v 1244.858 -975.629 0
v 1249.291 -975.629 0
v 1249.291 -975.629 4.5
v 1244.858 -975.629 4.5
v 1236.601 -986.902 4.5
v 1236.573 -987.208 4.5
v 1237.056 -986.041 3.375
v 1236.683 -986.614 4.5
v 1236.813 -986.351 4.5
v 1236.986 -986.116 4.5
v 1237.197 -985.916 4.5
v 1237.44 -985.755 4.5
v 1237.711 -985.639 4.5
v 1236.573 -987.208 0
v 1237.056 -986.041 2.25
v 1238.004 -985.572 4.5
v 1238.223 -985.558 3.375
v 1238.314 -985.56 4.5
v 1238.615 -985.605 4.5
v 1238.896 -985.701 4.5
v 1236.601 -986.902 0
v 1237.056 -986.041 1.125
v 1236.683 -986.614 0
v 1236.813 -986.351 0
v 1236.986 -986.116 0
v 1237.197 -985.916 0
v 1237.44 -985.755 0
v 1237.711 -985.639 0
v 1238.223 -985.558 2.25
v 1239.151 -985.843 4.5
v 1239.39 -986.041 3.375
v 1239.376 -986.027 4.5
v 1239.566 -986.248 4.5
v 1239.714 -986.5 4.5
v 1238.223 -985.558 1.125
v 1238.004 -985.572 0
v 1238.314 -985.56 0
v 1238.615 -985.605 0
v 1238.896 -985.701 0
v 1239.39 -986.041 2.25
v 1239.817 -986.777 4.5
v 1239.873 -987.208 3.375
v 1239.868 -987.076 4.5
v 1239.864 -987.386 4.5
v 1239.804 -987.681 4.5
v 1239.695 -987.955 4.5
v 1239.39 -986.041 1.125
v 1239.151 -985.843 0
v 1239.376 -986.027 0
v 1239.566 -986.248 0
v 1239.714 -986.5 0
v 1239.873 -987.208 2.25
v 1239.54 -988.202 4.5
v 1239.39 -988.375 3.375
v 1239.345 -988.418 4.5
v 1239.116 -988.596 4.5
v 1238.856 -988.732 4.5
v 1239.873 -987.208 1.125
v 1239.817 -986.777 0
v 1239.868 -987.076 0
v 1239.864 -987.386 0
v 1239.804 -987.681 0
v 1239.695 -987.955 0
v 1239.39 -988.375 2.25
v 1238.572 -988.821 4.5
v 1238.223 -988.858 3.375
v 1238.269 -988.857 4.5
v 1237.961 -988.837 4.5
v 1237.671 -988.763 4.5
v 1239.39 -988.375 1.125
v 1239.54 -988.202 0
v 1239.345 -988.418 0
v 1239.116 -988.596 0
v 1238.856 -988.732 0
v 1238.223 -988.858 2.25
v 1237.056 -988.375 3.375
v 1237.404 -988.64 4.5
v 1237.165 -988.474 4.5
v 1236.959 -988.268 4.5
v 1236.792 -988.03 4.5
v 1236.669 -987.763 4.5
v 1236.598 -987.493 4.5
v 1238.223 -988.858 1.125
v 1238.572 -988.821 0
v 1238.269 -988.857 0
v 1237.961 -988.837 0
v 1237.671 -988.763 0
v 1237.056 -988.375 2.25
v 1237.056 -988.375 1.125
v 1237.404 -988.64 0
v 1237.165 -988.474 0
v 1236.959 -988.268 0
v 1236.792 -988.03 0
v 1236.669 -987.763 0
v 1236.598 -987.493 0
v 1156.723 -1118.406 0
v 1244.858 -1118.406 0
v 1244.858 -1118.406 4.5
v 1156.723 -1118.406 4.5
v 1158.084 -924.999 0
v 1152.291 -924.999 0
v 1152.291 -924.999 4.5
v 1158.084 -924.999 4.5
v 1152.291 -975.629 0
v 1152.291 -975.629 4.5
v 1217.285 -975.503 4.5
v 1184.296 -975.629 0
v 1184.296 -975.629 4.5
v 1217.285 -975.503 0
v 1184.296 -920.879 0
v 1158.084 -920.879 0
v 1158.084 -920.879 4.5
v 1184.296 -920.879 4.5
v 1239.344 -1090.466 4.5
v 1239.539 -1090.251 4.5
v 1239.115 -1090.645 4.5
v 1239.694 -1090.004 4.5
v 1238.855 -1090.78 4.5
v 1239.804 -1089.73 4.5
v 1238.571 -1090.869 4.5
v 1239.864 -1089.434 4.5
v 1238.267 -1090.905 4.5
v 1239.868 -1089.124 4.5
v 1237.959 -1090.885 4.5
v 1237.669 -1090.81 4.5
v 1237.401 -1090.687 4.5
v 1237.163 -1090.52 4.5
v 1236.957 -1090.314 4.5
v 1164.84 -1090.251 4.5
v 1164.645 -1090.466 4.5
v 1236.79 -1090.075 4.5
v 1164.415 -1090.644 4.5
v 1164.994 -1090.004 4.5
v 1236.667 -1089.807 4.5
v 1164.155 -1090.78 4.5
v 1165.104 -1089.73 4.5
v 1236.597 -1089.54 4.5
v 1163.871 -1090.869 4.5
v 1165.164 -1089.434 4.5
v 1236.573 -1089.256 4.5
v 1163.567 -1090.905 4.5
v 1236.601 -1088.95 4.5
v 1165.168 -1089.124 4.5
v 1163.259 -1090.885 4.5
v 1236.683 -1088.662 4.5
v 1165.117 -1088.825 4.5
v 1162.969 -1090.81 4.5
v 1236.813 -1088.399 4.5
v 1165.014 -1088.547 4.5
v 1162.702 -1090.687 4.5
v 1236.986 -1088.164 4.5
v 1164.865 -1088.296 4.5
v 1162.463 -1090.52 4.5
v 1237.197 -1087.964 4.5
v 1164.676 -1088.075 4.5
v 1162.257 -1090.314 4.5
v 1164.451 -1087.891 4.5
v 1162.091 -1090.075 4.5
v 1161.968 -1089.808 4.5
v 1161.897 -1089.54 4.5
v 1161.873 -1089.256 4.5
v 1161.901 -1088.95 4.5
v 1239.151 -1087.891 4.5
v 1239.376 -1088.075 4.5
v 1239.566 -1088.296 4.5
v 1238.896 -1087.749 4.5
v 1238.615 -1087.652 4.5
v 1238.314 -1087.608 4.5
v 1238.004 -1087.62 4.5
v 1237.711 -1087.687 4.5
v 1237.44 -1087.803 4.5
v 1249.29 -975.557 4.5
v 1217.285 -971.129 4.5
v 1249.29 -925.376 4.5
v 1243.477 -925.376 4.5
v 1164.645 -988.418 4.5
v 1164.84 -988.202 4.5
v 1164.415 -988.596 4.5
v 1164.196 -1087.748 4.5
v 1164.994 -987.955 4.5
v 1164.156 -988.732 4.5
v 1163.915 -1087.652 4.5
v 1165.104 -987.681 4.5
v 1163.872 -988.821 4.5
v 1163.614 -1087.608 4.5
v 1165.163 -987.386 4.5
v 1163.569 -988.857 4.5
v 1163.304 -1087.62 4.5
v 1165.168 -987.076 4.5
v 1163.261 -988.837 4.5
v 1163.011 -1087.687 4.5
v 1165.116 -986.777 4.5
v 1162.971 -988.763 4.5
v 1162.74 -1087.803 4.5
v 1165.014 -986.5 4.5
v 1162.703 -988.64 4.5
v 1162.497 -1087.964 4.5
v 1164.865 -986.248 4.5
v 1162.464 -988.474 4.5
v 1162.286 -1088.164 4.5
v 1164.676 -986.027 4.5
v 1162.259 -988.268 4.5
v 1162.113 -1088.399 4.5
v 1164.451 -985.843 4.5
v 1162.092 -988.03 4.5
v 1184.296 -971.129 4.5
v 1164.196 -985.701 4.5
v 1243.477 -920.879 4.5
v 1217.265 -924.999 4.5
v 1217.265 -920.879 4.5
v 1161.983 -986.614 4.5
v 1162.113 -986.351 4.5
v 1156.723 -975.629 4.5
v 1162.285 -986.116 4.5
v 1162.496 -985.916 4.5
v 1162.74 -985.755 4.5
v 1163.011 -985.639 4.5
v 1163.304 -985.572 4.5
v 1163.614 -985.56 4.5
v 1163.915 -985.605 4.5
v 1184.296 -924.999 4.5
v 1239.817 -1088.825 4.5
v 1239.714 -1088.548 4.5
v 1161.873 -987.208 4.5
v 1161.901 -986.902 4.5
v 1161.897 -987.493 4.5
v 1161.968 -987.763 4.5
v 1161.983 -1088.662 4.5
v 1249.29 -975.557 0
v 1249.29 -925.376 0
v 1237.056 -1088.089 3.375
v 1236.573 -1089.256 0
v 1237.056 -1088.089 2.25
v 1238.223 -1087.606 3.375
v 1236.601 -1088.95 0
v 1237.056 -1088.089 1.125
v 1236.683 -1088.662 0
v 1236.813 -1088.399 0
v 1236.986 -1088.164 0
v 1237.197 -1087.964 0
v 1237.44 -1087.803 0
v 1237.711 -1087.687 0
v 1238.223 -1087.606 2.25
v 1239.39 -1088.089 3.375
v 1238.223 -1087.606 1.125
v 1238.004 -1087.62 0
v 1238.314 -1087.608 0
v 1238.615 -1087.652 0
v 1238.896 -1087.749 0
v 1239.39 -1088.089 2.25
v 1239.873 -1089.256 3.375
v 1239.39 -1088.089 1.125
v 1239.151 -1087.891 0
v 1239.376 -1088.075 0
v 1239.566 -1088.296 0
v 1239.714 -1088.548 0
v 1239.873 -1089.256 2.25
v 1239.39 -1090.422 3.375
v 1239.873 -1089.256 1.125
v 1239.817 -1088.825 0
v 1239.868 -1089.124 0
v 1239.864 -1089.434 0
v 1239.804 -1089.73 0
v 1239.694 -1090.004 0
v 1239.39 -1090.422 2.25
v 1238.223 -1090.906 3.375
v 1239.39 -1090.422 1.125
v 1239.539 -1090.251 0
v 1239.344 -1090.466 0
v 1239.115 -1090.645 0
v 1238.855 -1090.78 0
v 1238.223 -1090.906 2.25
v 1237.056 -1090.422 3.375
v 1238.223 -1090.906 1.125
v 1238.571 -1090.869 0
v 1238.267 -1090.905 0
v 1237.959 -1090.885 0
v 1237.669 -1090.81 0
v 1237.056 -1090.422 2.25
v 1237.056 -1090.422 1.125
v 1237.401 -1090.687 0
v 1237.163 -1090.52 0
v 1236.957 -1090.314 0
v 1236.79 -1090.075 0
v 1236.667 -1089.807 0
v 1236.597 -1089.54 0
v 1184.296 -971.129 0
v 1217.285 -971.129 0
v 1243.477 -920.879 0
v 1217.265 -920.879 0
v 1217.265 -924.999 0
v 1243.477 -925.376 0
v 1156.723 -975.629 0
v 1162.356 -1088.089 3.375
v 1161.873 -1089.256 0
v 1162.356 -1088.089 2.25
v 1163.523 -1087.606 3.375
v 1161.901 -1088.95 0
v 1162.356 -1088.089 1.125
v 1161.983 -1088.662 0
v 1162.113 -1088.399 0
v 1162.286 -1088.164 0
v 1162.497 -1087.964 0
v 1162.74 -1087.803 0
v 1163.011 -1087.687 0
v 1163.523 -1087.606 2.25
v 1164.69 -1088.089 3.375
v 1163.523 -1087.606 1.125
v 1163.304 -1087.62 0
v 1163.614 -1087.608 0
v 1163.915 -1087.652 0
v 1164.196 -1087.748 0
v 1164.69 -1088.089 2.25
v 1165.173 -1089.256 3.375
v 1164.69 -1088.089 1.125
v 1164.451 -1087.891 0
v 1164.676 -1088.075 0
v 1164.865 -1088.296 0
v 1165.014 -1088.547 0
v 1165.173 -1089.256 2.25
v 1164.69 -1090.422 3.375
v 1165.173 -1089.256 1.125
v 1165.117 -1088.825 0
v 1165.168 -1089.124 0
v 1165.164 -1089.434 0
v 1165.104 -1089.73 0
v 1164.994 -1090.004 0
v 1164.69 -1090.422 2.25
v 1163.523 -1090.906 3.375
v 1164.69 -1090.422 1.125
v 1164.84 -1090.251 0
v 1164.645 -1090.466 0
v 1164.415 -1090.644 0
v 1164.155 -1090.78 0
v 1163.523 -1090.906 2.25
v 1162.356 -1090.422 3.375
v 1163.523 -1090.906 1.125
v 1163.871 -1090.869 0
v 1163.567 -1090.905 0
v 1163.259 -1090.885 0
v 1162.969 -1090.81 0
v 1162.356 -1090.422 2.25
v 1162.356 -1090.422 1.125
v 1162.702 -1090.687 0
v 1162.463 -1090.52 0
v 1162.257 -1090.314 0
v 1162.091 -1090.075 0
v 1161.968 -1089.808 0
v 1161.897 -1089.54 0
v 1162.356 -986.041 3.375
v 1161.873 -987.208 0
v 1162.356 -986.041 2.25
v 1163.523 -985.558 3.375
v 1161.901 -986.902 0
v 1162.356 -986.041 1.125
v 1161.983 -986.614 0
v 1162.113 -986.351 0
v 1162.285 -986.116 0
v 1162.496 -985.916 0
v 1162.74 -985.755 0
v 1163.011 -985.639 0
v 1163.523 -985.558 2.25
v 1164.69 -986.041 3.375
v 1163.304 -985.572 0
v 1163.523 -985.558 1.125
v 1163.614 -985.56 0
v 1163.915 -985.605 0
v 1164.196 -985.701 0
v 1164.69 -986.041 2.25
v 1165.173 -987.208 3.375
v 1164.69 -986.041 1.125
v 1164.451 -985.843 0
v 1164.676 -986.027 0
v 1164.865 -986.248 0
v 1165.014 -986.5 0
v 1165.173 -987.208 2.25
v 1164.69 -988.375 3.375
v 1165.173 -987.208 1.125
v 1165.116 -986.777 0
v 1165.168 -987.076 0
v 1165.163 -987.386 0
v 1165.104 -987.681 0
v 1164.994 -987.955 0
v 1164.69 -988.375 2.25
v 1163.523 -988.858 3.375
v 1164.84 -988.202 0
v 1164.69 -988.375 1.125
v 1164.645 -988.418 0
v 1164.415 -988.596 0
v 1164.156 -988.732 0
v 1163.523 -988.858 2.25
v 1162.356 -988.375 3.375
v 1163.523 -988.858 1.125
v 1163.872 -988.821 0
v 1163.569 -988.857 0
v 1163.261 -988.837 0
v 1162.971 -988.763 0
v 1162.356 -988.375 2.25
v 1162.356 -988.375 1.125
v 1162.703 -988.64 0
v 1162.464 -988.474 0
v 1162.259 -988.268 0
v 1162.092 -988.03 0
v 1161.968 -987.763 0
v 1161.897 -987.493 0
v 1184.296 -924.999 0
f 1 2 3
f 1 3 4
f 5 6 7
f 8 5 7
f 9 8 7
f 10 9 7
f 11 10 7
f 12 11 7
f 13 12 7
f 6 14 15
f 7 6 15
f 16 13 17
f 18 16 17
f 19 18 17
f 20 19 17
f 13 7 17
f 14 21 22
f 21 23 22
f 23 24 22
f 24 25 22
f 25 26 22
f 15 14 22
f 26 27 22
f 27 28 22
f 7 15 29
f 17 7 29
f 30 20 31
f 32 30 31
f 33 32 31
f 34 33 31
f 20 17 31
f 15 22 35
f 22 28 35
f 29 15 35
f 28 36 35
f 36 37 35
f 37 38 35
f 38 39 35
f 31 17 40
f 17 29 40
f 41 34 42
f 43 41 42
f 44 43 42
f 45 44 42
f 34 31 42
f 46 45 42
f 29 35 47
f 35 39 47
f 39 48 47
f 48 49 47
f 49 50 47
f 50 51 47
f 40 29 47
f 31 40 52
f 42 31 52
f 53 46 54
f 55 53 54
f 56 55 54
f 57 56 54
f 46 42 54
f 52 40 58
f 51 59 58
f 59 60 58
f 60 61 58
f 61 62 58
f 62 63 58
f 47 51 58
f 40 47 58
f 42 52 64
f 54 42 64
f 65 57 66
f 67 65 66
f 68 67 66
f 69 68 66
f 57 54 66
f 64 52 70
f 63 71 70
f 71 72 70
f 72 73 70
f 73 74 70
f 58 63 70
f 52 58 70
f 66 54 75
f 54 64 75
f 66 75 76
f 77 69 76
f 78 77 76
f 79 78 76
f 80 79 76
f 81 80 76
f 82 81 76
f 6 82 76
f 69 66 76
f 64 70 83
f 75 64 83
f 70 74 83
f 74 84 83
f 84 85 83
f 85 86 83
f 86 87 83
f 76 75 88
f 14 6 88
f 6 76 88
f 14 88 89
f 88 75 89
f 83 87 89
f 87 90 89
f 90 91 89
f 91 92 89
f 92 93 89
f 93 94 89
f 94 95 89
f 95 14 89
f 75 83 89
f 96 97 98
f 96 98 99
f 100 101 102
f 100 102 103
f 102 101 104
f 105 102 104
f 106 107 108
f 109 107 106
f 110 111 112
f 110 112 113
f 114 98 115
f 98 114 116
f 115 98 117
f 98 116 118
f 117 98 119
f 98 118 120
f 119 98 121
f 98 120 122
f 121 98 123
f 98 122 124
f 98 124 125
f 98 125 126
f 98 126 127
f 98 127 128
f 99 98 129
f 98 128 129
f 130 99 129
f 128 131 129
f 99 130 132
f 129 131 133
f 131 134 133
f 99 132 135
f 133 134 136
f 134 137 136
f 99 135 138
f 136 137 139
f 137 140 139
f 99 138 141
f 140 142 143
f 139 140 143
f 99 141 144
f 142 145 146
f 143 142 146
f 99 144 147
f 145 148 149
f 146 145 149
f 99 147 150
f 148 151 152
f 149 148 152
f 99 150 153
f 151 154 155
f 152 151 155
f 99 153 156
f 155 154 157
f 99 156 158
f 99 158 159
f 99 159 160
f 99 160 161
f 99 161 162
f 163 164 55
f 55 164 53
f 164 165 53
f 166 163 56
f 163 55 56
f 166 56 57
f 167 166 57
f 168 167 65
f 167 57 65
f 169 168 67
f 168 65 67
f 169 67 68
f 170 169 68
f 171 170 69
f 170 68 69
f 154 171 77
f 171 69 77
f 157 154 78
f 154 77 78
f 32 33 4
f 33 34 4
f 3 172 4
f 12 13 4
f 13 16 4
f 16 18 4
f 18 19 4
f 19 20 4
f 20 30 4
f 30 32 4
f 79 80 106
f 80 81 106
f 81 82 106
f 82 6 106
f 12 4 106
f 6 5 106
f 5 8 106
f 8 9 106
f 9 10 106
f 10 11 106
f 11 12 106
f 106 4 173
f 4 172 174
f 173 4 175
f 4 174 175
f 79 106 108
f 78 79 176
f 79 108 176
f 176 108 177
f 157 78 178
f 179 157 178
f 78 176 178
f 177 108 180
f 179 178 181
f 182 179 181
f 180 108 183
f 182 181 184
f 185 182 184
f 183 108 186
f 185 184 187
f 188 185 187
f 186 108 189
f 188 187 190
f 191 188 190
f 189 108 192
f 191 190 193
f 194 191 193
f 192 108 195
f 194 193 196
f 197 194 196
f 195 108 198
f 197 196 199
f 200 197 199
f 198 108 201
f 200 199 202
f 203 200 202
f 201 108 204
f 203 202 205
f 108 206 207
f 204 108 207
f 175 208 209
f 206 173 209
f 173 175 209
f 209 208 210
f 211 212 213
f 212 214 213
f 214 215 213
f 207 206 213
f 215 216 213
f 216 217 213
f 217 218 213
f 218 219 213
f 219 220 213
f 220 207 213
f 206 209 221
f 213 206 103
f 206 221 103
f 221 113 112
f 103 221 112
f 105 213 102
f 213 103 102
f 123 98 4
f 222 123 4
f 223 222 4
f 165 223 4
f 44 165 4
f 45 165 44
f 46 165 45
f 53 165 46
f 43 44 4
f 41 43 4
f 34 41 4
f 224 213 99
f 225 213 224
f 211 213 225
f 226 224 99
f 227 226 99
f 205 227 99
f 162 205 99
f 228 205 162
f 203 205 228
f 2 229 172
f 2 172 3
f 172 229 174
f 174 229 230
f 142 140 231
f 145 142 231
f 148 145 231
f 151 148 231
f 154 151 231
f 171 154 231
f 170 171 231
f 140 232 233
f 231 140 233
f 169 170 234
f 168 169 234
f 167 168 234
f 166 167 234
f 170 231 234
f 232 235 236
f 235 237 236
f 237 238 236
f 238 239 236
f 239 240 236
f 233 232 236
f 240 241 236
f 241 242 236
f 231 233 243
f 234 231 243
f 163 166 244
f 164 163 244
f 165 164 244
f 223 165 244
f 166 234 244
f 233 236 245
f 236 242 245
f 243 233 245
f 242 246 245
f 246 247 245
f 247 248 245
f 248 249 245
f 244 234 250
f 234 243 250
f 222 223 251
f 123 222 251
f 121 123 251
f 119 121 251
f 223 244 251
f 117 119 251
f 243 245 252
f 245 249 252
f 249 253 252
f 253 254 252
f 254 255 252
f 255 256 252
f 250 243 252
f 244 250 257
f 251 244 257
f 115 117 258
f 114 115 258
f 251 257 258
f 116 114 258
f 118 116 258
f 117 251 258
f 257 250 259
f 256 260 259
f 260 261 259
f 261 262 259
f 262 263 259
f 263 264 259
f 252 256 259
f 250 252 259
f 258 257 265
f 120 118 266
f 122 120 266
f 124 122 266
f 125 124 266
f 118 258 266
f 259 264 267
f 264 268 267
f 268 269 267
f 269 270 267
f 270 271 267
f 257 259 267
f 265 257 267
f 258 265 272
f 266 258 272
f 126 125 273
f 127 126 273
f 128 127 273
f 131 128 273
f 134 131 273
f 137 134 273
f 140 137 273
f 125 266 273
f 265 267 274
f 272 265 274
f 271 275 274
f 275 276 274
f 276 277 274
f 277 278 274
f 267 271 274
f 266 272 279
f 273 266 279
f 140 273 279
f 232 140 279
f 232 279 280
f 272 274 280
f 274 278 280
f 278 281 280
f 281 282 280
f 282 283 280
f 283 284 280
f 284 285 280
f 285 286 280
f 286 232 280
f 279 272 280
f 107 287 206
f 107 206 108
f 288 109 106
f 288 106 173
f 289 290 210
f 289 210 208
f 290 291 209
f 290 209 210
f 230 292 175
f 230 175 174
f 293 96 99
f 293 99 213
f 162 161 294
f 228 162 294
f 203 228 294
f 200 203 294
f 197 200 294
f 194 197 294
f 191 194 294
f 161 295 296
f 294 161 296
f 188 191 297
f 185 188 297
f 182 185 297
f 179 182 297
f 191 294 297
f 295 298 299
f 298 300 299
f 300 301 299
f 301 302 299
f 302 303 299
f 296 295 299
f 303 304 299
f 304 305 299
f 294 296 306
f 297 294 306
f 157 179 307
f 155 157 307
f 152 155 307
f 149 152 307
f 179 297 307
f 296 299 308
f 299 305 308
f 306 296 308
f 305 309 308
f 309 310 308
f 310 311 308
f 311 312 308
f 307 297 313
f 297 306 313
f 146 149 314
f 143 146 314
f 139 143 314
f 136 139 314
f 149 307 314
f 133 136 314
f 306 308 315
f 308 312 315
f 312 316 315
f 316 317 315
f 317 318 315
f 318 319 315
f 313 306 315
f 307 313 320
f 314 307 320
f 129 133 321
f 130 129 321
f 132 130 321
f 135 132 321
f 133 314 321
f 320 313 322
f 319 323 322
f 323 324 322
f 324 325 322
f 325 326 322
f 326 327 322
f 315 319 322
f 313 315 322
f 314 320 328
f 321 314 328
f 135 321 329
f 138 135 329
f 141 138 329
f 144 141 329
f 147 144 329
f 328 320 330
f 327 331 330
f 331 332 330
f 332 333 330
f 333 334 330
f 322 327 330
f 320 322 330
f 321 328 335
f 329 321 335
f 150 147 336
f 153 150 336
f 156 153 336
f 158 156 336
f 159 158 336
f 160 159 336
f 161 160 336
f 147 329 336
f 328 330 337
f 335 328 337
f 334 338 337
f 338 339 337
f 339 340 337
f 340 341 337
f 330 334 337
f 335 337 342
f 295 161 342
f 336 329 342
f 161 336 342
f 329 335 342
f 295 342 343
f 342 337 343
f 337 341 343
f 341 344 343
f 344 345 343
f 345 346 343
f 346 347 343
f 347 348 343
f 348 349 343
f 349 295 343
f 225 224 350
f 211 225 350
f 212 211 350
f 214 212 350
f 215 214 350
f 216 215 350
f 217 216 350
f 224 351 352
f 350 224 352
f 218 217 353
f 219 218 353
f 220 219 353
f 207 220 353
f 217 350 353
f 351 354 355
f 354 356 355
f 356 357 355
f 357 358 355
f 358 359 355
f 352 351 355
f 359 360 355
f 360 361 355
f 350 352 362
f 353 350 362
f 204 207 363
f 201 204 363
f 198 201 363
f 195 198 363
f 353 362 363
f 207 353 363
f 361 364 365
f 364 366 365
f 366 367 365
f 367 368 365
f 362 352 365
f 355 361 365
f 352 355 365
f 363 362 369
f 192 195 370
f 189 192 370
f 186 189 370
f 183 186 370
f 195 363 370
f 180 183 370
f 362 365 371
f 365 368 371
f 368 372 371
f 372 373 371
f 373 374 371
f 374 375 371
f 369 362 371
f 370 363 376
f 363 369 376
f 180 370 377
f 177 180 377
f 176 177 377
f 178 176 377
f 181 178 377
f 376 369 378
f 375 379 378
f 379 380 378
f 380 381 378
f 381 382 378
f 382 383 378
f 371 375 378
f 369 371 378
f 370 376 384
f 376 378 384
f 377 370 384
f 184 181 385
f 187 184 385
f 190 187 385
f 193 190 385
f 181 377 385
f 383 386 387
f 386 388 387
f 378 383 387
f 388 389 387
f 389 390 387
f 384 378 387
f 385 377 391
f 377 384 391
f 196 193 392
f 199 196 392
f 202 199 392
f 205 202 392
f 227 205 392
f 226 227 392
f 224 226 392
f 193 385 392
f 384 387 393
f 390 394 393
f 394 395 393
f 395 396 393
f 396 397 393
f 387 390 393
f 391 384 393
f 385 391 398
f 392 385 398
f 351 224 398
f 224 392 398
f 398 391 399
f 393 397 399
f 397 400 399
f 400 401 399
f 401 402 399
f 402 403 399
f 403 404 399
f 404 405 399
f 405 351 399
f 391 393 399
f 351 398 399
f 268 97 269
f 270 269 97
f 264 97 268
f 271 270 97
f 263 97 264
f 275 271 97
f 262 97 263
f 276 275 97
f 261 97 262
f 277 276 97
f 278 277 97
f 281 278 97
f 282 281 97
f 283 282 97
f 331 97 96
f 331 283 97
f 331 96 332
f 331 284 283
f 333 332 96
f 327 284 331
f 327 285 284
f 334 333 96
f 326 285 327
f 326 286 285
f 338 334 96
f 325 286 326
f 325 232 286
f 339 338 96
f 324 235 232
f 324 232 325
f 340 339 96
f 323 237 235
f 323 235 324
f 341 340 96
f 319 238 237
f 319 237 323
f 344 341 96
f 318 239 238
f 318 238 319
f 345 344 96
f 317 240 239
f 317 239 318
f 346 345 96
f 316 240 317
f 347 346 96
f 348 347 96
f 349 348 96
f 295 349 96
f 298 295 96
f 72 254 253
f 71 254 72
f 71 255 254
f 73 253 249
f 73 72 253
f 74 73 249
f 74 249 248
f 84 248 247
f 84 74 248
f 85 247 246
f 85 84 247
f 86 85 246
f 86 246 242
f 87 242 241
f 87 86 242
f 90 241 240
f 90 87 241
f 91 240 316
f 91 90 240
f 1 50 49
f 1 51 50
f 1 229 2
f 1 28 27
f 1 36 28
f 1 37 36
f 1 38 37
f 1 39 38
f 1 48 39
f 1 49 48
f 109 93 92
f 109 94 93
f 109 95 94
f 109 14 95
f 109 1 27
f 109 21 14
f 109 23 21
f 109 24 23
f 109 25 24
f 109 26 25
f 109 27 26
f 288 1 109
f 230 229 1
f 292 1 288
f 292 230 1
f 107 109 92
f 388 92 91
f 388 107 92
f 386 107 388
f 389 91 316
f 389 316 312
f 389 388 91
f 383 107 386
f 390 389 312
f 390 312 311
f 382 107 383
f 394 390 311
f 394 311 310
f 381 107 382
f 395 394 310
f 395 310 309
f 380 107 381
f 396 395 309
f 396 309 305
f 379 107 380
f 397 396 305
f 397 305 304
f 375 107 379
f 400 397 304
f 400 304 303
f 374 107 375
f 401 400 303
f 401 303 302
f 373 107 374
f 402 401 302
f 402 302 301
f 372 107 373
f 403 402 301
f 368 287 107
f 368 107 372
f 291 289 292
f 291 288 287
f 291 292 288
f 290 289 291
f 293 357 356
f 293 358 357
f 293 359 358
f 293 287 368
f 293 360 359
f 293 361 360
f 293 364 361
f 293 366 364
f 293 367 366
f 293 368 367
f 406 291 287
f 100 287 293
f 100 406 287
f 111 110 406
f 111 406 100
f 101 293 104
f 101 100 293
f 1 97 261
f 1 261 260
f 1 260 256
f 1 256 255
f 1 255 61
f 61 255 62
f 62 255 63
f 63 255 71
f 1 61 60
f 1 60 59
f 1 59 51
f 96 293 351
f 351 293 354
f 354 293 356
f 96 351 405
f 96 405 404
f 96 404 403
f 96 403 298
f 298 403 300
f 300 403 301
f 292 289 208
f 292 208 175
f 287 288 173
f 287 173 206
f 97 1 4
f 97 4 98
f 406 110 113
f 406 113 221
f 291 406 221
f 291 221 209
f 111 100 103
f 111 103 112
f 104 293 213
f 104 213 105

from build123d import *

# Parameters (mm, degrees)
BOSS_EXTRUDE1_DEPTH = 4.5


with BuildPart() as part:
    # Model → Boss-Extrude1 (new body)
    with BuildSketch(Plane.XY):
        Polygon((1244.858374133, -975.629345589), (1244.858374133, -1118.40581472), (1156.723196377, -1118.40581472), (1156.723196377, -975.629345589), (1152.29071999, -975.629345589), (1152.29071999, -975.556990867), (1152.29071999, -950.670988096), (1152.29071999, -925.729211157), (1152.29071999, -924.998820047), (1158.083648599, -924.998820047), (1158.083648599, -920.879186992), (1184.295672482, -920.879186992), (1184.295672482, -924.998820047), (1217.264872473, -924.998820047), (1217.264872473, -920.879186992), (1243.476896356, -920.879186992), (1243.476896356, -925.37643338), (1249.290144965, -925.37643338), (1249.290144965, -952.082099206), (1249.290144965, -975.556990867), (1249.290850521, -975.629345589), align=None)
        Polygon((1184.296342759, -971.129347535), (1184.296342759, -975.629345589), (1217.285227751, -975.502557256), (1217.285227751, -971.129347535), align=None, mode=Mode.SUBTRACT)
        with BuildLine():
            add(Edge.make_bspline(
                [(1239.873341912, -1089.255822228), (1239.873341912, -1090.167047227), (1239.134695801, -1090.905693338), (1238.223118024, -1090.905693338), (1237.312245802, -1090.905693338), (1236.572929413, -1090.167047227), (1236.572929413, -1089.255822228)],
                knots=[2, 2, 2, 2, 3, 3, 3, 4, 4, 4, 4], degree=3))
            add(Edge.make_bspline(
                [(1236.572929413, -1089.255822228), (1236.572929413, -1088.344597228), (1237.312245802, -1087.605633617), (1238.223118024, -1087.605633617), (1239.134695801, -1087.605633617), (1239.873341912, -1088.344597228), (1239.873341912, -1089.255822228)],
                knots=[0, 0, 0, 0, 1, 1, 1, 2, 2, 2, 2], degree=3))
        make_face(mode=Mode.SUBTRACT)
        with BuildLine():
            add(Edge.make_bspline(
                [(1165.173317764, -1089.255822228), (1165.173317764, -1090.167047227), (1164.434706931, -1090.905693338), (1163.523129154, -1090.905693338), (1162.612256932, -1090.905693338), (1161.872905265, -1090.167047227), (1161.872905265, -1089.255822228)],
                knots=[2, 2, 2, 2, 3, 3, 3, 4, 4, 4, 4], degree=3))
            add(Edge.make_bspline(
                [(1161.872905265, -1089.255822228), (1161.872905265, -1088.344597228), (1162.612256932, -1087.605633617), (1163.523129154, -1087.605633617), (1164.434706931, -1087.605633617), (1165.173317764, -1088.344597228), (1165.173317764, -1089.255822228)],
                knots=[0, 0, 0, 0, 1, 1, 1, 2, 2, 2, 2], degree=3))
        make_face(mode=Mode.SUBTRACT)
        with BuildLine():
            add(Edge.make_bspline(
                [(1239.873341912, -987.207618087), (1239.873341912, -988.119195864), (1239.134695801, -988.857806697), (1238.223118024, -988.857806697), (1237.312245802, -988.857806697), (1236.572929413, -988.119195864), (1236.572929413, -987.207618087)],
                knots=[2, 2, 2, 2, 3, 3, 3, 4, 4, 4, 4], degree=3))
            add(Edge.make_bspline(
                [(1236.572929413, -987.207618087), (1236.572929413, -986.296745865), (1237.312245802, -985.557746976), (1238.223118024, -985.557746976), (1239.134695801, -985.557746976), (1239.873341912, -986.296745865), (1239.873341912, -987.207618087)],
                knots=[0, 0, 0, 0, 1, 1, 1, 2, 2, 2, 2], degree=3))
        make_face(mode=Mode.SUBTRACT)
        with BuildLine():
            add(Edge.make_bspline(
                [(1165.172964986, -987.207618087), (1165.172964986, -988.119195864), (1164.434354153, -988.857806697), (1163.522776376, -988.857806697), (1162.611904154, -988.857806697), (1161.872587765, -988.119195864), (1161.872587765, -987.207618087)],
                knots=[2, 2, 2, 2, 3, 3, 3, 4, 4, 4, 4], degree=3))
            add(Edge.make_bspline(
                [(1161.872587765, -987.207618087), (1161.872587765, -986.296745865), (1162.611904154, -985.557746976), (1163.522776376, -985.557746976), (1164.434354153, -985.557746976), (1165.172964986, -986.296745865), (1165.172964986, -987.207618087)],
                knots=[0, 0, 0, 0, 1, 1, 1, 2, 2, 2, 2], degree=3))
        make_face(mode=Mode.SUBTRACT)
    extrude(amount=BOSS_EXTRUDE1_DEPTH)


solid = part.part
